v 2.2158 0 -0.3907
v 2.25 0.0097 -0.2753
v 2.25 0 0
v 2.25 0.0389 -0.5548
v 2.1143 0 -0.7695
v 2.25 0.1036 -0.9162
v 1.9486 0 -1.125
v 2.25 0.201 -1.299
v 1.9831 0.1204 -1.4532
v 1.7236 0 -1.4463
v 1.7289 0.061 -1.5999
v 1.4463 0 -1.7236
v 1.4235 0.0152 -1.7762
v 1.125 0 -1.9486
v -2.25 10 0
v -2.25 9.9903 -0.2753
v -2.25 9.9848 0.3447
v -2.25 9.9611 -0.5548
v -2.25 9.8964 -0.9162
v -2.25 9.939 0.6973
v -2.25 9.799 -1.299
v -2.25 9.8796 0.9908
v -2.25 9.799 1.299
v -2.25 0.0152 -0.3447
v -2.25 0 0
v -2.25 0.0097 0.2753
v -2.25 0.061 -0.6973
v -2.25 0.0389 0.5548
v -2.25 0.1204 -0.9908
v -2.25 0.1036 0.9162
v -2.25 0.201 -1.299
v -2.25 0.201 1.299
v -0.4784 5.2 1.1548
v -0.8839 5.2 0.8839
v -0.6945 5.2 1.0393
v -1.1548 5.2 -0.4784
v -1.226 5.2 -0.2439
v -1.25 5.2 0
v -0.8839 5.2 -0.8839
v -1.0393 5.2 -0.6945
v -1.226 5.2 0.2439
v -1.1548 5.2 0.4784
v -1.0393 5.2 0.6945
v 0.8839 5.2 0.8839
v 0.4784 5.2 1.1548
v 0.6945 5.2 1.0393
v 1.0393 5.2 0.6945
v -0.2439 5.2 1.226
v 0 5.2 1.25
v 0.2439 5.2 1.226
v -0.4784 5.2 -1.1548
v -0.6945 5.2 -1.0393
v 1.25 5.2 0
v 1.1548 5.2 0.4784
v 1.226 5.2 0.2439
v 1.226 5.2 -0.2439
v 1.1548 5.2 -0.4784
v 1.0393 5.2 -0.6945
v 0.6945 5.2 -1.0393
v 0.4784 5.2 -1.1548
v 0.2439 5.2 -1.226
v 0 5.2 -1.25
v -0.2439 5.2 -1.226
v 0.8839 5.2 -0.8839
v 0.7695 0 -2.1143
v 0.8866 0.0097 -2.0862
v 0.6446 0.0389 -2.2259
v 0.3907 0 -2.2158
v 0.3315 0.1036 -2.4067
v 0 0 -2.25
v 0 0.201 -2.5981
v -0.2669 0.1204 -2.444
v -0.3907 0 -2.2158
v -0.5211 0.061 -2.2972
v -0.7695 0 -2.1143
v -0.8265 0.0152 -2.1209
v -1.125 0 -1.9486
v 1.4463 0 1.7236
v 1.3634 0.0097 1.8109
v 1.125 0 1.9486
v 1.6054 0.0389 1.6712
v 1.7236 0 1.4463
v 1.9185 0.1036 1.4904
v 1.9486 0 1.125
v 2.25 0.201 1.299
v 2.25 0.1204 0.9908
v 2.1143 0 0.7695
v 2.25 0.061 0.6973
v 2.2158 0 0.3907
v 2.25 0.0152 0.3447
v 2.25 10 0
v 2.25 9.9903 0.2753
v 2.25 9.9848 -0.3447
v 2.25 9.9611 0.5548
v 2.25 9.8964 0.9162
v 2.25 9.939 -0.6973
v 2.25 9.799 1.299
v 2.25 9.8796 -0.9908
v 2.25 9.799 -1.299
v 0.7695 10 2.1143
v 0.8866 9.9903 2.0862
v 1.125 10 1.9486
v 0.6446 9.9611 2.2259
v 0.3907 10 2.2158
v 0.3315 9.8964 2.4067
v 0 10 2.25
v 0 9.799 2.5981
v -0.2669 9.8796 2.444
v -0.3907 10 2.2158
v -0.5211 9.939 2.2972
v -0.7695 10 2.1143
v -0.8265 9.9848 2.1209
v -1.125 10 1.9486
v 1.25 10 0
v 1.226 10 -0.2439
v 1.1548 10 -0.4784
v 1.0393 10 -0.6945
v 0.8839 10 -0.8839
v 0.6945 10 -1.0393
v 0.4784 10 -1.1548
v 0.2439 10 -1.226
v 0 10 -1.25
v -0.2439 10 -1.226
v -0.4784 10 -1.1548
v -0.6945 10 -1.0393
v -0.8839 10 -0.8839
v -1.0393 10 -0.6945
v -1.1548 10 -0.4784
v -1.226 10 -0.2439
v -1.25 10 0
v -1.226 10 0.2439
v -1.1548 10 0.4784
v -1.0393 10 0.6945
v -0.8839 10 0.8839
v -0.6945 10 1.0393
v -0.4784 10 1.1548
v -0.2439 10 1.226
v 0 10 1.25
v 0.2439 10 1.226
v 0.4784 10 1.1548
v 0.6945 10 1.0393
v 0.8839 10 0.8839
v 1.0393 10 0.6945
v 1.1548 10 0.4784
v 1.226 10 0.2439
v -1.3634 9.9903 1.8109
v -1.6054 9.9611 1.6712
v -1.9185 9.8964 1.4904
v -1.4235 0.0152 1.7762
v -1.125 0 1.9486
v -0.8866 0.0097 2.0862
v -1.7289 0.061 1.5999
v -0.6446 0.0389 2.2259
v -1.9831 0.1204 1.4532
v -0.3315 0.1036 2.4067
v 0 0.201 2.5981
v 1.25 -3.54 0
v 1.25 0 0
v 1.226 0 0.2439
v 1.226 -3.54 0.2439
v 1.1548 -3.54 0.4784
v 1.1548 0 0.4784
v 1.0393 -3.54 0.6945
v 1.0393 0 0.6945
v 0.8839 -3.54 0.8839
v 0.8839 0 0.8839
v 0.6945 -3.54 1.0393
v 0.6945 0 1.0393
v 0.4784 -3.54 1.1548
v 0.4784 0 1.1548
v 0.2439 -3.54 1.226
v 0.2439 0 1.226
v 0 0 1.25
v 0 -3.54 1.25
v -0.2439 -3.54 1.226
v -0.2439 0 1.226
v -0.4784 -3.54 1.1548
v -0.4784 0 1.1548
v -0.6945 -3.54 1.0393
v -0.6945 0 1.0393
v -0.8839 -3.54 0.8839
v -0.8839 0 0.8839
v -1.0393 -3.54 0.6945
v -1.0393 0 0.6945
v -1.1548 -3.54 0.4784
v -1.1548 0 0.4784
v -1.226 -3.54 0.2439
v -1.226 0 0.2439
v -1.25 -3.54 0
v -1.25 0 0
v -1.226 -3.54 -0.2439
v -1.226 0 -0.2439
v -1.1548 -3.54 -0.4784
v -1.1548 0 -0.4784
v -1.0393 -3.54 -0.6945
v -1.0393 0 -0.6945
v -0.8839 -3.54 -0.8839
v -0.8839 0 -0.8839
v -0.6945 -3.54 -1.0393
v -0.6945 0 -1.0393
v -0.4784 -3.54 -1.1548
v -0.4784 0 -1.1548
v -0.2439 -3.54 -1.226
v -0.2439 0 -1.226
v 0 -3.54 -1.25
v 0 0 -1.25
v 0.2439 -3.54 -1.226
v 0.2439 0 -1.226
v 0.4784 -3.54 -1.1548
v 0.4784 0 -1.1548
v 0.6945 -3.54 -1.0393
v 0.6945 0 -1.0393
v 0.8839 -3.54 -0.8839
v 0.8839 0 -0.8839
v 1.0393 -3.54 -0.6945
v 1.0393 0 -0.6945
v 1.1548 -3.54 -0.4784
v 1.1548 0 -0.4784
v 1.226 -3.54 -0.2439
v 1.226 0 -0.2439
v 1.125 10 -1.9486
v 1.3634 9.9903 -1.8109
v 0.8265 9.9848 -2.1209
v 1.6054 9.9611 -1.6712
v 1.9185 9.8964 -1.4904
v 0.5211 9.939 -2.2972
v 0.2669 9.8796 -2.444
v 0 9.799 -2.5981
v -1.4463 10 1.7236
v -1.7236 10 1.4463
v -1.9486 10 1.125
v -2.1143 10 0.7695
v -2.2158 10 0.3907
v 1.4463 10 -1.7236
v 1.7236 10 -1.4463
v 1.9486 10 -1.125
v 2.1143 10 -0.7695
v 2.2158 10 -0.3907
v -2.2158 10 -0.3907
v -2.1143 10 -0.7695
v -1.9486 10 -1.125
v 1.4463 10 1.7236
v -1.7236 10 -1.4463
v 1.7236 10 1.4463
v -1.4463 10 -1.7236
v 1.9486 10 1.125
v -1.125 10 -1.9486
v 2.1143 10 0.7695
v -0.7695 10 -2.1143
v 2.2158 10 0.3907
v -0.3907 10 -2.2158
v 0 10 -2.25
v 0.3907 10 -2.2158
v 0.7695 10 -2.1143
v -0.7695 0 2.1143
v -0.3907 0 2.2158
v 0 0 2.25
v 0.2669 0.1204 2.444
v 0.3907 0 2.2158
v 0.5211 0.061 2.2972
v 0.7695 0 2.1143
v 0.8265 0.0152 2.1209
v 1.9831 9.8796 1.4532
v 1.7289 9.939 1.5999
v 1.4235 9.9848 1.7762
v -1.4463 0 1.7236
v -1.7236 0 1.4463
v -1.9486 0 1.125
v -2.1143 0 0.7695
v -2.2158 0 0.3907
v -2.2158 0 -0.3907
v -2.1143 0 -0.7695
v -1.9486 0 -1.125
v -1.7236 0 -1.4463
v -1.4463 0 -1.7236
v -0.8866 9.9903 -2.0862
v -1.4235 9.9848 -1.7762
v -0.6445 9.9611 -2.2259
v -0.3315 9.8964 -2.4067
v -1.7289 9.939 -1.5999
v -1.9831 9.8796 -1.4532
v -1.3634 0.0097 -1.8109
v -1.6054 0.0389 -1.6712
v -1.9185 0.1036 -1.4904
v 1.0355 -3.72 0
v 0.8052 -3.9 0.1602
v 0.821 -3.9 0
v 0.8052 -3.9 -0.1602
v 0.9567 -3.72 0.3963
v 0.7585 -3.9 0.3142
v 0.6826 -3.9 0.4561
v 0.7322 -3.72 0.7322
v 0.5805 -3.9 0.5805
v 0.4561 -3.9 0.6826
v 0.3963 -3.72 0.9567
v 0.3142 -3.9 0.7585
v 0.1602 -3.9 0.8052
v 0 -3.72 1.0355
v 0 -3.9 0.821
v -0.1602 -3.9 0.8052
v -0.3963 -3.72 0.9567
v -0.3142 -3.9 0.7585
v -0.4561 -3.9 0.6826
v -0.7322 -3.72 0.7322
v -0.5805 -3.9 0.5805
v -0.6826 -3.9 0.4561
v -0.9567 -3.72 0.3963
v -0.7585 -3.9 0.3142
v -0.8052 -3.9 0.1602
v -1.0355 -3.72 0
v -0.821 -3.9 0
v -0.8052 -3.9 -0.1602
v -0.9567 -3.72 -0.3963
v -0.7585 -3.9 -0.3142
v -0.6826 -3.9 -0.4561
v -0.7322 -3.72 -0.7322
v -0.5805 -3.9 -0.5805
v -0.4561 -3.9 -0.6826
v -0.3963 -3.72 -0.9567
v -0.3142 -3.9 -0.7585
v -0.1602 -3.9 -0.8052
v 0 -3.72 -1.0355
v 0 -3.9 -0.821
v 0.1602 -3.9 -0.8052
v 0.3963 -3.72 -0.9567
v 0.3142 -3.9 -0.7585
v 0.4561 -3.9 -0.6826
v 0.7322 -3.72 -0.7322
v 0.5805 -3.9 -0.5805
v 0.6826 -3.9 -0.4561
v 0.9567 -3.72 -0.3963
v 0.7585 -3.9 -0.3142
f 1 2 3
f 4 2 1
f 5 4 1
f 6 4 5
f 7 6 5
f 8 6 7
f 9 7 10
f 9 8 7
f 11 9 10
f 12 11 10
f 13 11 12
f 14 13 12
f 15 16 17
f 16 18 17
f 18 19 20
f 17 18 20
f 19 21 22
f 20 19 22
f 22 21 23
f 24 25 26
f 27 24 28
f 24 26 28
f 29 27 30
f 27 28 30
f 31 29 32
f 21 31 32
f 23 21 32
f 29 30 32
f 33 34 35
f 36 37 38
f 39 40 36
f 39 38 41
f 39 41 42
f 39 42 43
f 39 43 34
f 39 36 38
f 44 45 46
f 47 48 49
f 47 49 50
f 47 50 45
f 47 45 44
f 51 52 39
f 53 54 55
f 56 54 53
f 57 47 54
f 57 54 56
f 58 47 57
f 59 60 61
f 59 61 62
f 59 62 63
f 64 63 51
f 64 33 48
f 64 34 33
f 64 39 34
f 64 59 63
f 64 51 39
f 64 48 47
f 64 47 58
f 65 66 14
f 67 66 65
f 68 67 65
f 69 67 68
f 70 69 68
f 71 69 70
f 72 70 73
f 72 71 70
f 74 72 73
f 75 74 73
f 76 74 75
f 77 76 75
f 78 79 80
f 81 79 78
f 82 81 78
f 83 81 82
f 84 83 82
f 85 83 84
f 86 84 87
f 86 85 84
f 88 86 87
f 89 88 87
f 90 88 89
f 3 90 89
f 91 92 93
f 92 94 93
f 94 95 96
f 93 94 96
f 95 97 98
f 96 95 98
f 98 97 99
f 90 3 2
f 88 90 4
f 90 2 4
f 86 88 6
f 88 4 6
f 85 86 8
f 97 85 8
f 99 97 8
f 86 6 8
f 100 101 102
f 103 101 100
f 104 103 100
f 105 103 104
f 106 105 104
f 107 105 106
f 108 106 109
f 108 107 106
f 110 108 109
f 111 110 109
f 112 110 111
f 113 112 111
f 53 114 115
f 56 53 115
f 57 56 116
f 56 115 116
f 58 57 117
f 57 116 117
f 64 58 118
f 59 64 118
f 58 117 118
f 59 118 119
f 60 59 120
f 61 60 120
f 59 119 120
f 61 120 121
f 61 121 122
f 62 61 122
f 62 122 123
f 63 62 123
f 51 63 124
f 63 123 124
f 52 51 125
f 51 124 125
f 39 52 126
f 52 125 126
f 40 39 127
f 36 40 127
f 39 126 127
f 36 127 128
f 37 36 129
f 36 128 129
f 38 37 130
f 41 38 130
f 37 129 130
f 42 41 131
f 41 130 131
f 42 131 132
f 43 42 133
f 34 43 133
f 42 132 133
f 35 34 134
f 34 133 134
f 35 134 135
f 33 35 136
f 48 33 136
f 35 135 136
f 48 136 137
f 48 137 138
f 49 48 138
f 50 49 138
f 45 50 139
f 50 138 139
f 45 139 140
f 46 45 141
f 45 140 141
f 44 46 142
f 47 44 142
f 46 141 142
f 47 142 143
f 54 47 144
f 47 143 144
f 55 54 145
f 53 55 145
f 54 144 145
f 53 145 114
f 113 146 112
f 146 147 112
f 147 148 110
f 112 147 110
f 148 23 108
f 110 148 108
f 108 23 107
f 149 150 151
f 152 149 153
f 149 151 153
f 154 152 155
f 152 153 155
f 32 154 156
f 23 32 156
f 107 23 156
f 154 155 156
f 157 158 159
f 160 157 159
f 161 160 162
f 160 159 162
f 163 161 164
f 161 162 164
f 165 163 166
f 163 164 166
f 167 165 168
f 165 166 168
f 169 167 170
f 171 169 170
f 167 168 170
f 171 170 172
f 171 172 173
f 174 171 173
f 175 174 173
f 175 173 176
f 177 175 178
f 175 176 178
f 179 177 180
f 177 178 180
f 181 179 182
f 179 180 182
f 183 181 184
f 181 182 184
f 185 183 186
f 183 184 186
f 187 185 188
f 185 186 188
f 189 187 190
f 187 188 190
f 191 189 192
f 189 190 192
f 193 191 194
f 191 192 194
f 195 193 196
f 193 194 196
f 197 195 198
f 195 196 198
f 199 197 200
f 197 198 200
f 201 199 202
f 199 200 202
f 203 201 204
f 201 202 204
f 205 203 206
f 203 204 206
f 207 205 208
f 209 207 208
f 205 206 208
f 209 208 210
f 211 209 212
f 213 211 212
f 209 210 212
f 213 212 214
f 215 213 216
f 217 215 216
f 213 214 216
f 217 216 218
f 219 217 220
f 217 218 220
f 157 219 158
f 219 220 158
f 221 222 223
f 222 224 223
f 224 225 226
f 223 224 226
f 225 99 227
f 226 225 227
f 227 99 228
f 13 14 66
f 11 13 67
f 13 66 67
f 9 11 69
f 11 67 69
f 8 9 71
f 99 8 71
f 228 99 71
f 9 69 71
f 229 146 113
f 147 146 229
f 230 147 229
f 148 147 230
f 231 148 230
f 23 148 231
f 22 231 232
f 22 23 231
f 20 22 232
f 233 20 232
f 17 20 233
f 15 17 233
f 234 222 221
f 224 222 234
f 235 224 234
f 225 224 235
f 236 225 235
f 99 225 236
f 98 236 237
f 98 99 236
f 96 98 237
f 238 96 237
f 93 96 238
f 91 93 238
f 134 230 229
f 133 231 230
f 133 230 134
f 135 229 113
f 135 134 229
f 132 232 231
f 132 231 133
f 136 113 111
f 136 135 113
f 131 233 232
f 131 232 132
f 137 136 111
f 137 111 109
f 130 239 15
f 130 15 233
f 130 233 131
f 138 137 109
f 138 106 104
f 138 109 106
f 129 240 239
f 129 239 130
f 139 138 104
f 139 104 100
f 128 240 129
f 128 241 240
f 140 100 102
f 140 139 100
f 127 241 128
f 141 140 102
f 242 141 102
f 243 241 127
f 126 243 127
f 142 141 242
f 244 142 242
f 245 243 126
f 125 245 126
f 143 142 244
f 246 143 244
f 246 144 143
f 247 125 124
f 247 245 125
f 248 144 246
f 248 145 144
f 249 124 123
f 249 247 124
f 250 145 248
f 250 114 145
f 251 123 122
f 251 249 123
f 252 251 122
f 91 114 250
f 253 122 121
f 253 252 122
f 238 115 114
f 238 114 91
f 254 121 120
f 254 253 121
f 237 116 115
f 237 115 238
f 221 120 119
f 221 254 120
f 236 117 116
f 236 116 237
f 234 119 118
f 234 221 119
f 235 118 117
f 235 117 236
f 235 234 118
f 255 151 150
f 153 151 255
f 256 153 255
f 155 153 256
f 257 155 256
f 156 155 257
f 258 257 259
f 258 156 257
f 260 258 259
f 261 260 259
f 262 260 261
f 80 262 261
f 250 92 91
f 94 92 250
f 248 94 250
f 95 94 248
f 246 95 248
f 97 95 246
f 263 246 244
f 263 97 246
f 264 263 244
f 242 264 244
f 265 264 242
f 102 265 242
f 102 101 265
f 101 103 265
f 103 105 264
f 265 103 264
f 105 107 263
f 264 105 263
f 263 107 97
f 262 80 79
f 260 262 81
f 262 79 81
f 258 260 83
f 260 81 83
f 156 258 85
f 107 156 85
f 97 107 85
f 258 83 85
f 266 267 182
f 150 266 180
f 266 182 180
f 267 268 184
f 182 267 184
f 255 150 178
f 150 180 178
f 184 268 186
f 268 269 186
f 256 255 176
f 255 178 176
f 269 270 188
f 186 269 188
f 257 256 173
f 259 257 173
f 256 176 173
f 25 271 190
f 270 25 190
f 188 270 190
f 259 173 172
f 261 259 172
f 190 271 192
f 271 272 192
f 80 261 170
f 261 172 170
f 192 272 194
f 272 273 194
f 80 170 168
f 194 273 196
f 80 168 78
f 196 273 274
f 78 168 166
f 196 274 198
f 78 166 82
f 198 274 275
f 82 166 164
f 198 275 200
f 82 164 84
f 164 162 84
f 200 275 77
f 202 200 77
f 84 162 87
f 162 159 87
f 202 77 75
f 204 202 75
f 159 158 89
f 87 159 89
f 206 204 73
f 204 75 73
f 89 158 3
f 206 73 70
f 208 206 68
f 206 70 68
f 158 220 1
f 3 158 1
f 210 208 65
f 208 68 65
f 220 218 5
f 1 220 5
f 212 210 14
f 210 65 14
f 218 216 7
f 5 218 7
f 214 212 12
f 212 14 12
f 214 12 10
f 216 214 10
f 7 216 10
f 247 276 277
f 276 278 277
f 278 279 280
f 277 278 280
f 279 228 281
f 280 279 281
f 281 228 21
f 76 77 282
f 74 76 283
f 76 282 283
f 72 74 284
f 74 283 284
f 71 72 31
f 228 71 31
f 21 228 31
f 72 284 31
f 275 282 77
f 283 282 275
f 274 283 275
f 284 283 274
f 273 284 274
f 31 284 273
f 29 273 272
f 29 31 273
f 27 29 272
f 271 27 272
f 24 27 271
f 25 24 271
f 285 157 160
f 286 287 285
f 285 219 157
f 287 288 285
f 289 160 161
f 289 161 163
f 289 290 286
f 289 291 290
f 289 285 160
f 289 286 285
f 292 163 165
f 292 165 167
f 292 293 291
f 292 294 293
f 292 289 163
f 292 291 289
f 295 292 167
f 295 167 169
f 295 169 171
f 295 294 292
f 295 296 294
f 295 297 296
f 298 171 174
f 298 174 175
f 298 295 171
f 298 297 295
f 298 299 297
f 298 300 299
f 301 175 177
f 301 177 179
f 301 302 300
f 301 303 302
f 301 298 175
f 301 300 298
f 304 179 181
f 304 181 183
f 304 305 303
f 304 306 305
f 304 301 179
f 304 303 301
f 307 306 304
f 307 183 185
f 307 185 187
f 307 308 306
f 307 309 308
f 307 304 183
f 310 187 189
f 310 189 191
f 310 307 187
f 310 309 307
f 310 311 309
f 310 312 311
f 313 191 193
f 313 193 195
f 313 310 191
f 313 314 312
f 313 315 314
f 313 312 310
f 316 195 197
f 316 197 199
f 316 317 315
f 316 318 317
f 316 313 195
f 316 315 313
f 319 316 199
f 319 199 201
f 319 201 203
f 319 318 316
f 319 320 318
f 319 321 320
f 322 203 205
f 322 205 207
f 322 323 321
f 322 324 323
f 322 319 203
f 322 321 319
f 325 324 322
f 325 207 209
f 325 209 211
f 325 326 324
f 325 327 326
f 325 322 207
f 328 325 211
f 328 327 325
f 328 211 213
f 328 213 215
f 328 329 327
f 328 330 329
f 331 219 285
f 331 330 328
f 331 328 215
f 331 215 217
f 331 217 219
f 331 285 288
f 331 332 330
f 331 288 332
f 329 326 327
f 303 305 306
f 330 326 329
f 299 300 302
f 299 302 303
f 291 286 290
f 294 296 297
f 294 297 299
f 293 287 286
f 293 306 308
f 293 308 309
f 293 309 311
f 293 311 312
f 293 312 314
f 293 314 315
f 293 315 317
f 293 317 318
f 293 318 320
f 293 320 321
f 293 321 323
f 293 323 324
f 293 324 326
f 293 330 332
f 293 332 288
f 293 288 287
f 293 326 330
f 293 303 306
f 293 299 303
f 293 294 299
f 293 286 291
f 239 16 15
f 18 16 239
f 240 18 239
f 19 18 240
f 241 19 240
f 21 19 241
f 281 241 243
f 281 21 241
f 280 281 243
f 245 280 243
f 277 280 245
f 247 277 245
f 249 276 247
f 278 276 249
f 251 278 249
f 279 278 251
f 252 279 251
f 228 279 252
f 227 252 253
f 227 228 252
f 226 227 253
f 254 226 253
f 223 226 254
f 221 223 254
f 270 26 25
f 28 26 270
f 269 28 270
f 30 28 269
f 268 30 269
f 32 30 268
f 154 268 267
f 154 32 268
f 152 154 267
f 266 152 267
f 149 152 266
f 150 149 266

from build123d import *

# Parameters (mm, degrees)
BOSS_EXTRUDE1_DEPTH = 10
SKETCH2_OUTSIDE_W   = 47.032
SKETCH2_OUTSIDE_H   = 47.728
SKETCH2_OUTSIDE_R   = 2.25
CUT_EXTRUDE1_DEPTH  = 11
CUT_EXTRUDE1_TAPER  = 60
SKETCH3_OUTSIDE_W   = 47.032
SKETCH3_OUTSIDE_H   = 47.728
SKETCH3_OUTSIDE_R   = 2.25
CUT_EXTRUDE2_DEPTH  = 11
CUT_EXTRUDE2_TAPER  = 60
SKETCH4_R           = 1.25
CUT_EXTRUDE3_DEPTH  = 4.8
SKETCH5_R           = 1.25
BOSS_EXTRUDE2_DEPTH = 3.9
CHAMFER1_SIZE       = 0.36
CHAMFER1_SIZE2      = 0.429031293


with BuildPart() as part:
    # Sketch1 → Boss-Extrude1 (new body)
    with BuildSketch(Plane(origin=(0, 0, 0), x_dir=(1, 0, 0), z_dir=(0, 1, 0))):
        Polygon((0, 2.598076211), (-2.25, 1.299038106), (-2.25, -1.299038106), (0, -2.598076211), (2.25, -1.299038106), (2.25, 1.299038106), align=None)
    extrude(amount=BOSS_EXTRUDE1_DEPTH)

    # Sketch2 outside → Cut-Extrude1 (cut, through all)
    with BuildSketch(Plane(origin=(0, 10, 0), x_dir=(1, 0, 0), z_dir=(0, 1, 0))):
        Rectangle(SKETCH2_OUTSIDE_W, SKETCH2_OUTSIDE_H)
        Circle(SKETCH2_OUTSIDE_R, mode=Mode.SUBTRACT)
    extrude(amount=-CUT_EXTRUDE1_DEPTH, taper=CUT_EXTRUDE1_TAPER, mode=Mode.SUBTRACT)

    # Sketch3 outside → Cut-Extrude2 (cut, through all)
    with BuildSketch(Plane.XZ):
        Rectangle(SKETCH3_OUTSIDE_W, SKETCH3_OUTSIDE_H)
        Circle(SKETCH3_OUTSIDE_R, mode=Mode.SUBTRACT)
    extrude(amount=-CUT_EXTRUDE2_DEPTH, taper=CUT_EXTRUDE2_TAPER, mode=Mode.SUBTRACT)

    # Sketch4 → Cut-Extrude3 (cut)
    with BuildSketch(Plane(origin=(0, 10, 0), x_dir=(1, 0, 0), z_dir=(0, 1, 0))):
        Circle(SKETCH4_R)
    extrude(amount=-CUT_EXTRUDE3_DEPTH, mode=Mode.SUBTRACT)

    # Sketch5 → Boss-Extrude2 (add)
    with BuildSketch(Plane.XZ):
        Circle(SKETCH5_R)
    extrude(amount=BOSS_EXTRUDE2_DEPTH)

    # Chamfer1
    chamfer1_edges = [part.edges().sort_by_distance(p)[0] for p in [
        (-1.25, -3.9, 0),
    ]]
    chamfer1_side = [part.faces().sort_by_distance(p)[0] for p in [
        (-1.25, -1.95, 0),
    ]]
    chamfer(chamfer1_edges, length=CHAMFER1_SIZE, length2=CHAMFER1_SIZE2, reference=chamfer1_side[0])


solid = part.part
